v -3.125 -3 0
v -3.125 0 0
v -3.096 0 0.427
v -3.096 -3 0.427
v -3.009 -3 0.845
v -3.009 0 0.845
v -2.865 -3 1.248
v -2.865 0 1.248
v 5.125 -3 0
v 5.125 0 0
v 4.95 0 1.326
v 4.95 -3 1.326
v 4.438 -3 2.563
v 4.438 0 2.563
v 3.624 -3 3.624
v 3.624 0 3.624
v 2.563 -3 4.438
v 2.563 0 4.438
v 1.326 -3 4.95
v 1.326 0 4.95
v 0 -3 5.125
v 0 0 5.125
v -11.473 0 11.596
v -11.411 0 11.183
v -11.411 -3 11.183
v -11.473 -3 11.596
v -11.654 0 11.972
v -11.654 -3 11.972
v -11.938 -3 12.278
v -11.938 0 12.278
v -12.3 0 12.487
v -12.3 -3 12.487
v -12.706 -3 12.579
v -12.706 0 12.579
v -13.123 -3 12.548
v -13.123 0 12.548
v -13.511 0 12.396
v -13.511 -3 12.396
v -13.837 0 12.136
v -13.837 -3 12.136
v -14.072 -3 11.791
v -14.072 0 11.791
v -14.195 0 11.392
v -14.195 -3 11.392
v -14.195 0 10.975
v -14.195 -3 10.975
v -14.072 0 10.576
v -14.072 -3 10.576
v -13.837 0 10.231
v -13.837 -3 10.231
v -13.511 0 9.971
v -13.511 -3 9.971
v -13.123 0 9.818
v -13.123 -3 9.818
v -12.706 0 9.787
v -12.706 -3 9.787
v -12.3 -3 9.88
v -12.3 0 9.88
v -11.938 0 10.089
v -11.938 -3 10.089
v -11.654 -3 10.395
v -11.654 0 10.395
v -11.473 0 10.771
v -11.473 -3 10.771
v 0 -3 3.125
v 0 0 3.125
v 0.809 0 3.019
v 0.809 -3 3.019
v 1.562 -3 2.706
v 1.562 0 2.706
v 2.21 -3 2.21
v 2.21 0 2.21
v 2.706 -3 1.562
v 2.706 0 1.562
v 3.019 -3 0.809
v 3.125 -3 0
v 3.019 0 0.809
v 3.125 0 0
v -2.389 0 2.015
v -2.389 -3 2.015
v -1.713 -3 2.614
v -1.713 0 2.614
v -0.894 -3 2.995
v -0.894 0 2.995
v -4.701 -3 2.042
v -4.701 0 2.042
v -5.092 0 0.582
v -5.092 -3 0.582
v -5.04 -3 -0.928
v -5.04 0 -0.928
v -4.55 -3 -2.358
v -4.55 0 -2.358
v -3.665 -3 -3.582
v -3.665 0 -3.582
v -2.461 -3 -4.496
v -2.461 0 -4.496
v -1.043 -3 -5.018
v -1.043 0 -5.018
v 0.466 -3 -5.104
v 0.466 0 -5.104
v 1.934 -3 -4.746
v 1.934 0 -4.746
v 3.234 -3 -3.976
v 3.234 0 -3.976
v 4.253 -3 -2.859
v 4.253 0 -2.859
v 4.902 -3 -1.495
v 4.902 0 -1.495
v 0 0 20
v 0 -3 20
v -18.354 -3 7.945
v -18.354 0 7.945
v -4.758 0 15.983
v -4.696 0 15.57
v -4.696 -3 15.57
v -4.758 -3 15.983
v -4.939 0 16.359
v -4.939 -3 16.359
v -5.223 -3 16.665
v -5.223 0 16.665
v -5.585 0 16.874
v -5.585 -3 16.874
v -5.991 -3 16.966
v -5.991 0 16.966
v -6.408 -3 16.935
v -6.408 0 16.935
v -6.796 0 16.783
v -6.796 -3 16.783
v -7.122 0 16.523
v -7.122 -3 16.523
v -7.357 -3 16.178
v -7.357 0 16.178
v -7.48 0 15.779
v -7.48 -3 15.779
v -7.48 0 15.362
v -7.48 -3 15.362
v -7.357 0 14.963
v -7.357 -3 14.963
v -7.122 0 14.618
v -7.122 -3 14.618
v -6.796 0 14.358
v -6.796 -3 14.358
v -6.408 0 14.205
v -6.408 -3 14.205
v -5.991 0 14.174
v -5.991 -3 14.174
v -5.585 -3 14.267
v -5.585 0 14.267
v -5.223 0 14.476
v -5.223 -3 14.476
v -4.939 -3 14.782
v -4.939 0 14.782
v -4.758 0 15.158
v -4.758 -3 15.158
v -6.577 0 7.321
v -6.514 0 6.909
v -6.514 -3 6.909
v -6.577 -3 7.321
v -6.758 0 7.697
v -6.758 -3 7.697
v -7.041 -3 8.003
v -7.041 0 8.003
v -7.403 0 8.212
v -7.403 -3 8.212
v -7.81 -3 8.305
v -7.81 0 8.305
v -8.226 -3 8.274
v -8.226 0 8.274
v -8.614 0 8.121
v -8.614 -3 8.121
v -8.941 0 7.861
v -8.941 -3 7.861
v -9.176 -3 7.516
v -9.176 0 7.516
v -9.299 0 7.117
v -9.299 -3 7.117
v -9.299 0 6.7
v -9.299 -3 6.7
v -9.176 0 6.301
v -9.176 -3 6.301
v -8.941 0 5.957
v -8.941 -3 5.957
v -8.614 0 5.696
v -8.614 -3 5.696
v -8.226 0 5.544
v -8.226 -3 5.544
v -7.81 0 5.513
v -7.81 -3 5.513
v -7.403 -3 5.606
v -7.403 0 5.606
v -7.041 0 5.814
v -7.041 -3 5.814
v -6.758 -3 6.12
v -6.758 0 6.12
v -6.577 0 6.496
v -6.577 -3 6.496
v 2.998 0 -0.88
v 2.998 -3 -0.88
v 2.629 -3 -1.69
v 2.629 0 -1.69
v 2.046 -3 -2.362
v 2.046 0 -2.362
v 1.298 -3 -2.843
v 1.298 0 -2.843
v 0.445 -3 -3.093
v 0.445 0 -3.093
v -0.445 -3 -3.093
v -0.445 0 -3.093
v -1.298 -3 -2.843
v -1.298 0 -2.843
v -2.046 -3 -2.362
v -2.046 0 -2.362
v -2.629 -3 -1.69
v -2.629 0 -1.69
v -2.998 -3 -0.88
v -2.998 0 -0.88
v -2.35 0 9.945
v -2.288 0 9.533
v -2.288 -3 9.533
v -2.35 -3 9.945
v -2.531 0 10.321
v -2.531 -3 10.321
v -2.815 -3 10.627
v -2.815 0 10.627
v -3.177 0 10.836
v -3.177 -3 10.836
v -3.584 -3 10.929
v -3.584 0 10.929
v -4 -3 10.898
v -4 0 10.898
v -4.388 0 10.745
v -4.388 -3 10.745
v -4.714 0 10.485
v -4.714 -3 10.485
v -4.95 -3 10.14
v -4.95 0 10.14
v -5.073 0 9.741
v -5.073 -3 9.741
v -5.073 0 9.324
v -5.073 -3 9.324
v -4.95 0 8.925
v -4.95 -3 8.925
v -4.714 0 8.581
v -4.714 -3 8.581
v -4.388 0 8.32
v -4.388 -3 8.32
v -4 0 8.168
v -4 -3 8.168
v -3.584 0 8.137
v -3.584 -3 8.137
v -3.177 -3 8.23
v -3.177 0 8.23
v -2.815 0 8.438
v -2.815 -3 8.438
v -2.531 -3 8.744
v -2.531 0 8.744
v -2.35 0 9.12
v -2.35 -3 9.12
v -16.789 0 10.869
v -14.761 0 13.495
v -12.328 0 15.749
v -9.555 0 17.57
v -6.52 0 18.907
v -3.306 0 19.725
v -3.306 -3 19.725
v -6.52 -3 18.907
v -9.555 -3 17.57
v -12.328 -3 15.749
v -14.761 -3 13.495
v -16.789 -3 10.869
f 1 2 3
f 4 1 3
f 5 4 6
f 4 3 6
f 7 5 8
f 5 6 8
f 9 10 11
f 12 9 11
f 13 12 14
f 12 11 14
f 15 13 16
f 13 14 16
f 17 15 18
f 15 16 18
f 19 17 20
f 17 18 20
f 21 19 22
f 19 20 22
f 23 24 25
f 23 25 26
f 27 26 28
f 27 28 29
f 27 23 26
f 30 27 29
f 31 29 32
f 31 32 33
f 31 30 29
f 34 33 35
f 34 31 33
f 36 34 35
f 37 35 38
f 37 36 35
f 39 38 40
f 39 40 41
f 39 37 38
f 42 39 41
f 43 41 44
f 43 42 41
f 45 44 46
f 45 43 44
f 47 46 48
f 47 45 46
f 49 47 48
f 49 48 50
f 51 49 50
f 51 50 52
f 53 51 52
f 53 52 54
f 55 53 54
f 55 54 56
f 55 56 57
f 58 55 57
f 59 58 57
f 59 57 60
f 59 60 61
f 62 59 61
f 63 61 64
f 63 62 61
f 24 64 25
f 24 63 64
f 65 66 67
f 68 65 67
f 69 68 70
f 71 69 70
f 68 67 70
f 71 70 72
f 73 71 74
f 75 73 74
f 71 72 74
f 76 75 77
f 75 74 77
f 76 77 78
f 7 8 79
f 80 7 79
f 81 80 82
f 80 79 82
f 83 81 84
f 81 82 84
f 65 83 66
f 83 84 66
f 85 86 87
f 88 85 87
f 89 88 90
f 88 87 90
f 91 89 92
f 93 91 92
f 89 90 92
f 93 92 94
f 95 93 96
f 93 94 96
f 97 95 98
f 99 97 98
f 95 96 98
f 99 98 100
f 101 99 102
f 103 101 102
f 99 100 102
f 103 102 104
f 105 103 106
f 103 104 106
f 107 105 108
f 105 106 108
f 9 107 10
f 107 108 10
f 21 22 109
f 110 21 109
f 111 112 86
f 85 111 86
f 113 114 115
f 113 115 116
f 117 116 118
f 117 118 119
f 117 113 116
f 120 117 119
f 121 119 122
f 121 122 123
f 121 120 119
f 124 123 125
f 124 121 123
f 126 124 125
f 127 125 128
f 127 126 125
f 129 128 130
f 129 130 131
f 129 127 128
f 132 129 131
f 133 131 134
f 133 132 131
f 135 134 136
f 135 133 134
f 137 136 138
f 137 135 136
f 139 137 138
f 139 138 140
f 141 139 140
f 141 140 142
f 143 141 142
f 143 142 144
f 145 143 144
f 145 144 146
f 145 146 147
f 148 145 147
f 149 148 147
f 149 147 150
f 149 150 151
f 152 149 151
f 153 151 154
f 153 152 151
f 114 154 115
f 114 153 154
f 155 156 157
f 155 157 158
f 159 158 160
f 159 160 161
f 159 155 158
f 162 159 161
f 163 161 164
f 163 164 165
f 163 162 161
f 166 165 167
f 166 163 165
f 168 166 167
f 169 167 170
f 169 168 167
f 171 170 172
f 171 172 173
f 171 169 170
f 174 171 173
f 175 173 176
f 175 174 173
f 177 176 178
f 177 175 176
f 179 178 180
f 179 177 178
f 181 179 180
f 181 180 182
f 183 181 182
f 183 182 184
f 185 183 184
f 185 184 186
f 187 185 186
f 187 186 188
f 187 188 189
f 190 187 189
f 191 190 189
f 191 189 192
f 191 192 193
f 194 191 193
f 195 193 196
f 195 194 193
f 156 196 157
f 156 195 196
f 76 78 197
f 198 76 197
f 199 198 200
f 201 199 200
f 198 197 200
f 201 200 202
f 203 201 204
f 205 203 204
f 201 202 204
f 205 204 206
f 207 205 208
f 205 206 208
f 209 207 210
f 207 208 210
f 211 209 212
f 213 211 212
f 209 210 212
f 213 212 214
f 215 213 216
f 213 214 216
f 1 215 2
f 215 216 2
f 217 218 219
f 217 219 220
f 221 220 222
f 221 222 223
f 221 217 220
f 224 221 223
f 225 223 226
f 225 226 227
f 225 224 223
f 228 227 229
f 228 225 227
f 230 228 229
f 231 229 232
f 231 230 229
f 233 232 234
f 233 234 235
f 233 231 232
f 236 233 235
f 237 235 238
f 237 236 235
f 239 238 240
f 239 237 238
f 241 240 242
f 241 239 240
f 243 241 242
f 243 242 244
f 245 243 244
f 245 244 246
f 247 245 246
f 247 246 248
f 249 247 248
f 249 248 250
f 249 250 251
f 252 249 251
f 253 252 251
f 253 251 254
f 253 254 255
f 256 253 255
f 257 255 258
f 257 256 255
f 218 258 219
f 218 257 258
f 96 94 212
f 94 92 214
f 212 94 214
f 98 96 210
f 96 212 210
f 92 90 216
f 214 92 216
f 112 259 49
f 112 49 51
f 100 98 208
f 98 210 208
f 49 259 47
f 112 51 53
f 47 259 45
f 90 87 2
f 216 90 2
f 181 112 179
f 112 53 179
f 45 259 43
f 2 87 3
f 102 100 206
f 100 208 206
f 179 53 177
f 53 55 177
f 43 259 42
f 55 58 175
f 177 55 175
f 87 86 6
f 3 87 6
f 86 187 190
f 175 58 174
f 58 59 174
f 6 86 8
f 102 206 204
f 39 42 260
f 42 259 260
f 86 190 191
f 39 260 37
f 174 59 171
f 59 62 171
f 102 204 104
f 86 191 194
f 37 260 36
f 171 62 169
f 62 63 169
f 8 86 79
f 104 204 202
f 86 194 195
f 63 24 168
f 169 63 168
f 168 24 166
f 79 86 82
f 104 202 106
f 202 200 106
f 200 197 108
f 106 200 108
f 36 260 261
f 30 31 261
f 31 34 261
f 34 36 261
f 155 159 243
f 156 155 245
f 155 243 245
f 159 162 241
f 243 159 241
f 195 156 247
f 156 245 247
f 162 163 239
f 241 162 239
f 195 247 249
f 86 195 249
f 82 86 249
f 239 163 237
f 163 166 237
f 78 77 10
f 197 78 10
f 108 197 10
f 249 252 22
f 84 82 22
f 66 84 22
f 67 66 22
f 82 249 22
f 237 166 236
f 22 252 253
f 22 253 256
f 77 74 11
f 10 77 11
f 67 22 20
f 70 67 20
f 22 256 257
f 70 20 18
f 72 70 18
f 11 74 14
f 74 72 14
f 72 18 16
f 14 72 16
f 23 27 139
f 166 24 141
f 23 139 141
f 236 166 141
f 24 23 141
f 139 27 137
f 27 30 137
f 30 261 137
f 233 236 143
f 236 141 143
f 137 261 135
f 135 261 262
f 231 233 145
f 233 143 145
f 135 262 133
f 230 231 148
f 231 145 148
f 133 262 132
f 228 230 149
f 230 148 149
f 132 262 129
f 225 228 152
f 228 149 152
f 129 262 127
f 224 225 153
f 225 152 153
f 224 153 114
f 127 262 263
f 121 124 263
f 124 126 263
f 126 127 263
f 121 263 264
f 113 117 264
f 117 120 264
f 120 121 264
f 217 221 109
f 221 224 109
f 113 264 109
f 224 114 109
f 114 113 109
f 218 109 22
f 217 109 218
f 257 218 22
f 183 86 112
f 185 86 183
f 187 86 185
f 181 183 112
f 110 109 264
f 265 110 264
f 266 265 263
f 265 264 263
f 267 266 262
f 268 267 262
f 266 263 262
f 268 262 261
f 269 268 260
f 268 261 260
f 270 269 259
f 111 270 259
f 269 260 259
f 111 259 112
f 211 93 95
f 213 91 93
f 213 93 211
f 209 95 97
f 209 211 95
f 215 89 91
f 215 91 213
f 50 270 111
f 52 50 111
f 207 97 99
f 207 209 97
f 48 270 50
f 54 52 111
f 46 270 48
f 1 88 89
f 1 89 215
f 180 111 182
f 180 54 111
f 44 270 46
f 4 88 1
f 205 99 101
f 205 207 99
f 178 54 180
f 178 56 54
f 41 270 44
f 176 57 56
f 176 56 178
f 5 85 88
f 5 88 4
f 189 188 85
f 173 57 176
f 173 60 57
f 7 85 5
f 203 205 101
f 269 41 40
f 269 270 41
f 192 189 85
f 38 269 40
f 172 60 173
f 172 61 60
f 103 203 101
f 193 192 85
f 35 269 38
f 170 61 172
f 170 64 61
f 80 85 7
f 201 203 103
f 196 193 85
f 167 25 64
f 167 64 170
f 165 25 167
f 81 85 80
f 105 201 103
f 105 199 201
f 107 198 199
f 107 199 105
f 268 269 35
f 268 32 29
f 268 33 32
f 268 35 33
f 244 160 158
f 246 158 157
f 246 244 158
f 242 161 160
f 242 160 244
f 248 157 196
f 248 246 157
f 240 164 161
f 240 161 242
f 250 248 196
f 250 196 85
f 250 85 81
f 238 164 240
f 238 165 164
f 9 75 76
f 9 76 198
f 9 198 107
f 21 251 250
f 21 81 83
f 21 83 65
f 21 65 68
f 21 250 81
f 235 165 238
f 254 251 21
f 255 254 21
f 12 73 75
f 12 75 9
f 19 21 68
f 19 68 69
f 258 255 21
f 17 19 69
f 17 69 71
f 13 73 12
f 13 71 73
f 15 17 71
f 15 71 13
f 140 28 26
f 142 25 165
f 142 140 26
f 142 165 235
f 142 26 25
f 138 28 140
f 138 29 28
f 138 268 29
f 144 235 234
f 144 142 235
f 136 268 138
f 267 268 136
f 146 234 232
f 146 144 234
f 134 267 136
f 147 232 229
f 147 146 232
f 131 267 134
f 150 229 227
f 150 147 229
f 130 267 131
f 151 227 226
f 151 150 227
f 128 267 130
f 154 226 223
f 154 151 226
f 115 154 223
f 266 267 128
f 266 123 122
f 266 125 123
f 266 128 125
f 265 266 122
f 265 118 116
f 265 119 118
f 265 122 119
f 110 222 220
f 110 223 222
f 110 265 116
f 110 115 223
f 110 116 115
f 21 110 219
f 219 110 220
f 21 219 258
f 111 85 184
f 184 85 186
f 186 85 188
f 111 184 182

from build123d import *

# Parameters (mm, degrees)
F0_R     = 1.4
F1_DEPTH = 3


# Not quite as in the source:
# - a feature names something its author has since deleted; it is built from what else it names


with BuildPart() as f1:
    # F0 (on Front) → F1 (new body)
    with BuildSketch(Plane.XZ):
        with BuildLine():
            Line((-5.125, 0), (-3.125, 0))
            ThreePointArc((-3.125, 0), (-3.0593081858, 0.6373840479), (-2.8649946083, 1.2479707105))
            Line((-2.8649946083, 1.2479707105), (-4.700755545, 2.0416959387))
            ThreePointArc((-4.700755545, 2.0416959387), (-5.0178181099, 1.0426535455), (-5.125, 0))
        make_face()
        with BuildLine():
            ThreePointArc((3.125, 0), (0, -3.125), (-3.125, 0))
            Line((-3.125, 0), (-5.125, 0))
            ThreePointArc((-5.125, 0), (0, -5.125), (5.125, 0))
            ThreePointArc((5.125, 0), (3.6239222536, 3.6239222536), (0, 5.125))
            Line((0, 5.125), (0, 3.125))
            ThreePointArc((0, 3.125), (2.2097086912, 2.2097086912), (3.125, 0))
        make_face()
        with BuildLine():
            Line((-4.700755545, 2.0416959387), (-2.8649946083, 1.2479707105))
            ThreePointArc((-2.8649946083, 1.2479707105), (-1.7125589814, 2.6139561464), (0, 3.125))
            Line((0, 3.125), (0, 5.125))
            ThreePointArc((0, 5.125), (-2.8108658198, 4.2854006047), (-4.700755545, 2.0416959387))
        make_face()
        with BuildLine():
            Line((-18.3542016569, 7.9450161447), (-4.700755545, 2.0416959387))
            ThreePointArc((-4.700755545, 2.0416959387), (-2.8108658198, 4.2854006047), (0, 5.125))
            Line((0, 5.125), (0, 20))
            ThreePointArc((0, 20), (-10.9795190493, 16.7167628878), (-18.3542016569, 7.9450161447))
        make_face()
        with Locations((-7.9143406, 6.9087709696)):
            Circle(F0_R, mode=Mode.SUBTRACT)
        with Locations((-3.6882084925, 9.5327961412)):
            Circle(F0_R, mode=Mode.SUBTRACT)
        with Locations((-12.8110766731, 11.1833441447)):
            Circle(F0_R, mode=Mode.SUBTRACT)
        with Locations((-6.0959799545, 15.5703980315)):
            Circle(F0_R, mode=Mode.SUBTRACT)
    extrude(amount=F1_DEPTH)


solid = f1.part
